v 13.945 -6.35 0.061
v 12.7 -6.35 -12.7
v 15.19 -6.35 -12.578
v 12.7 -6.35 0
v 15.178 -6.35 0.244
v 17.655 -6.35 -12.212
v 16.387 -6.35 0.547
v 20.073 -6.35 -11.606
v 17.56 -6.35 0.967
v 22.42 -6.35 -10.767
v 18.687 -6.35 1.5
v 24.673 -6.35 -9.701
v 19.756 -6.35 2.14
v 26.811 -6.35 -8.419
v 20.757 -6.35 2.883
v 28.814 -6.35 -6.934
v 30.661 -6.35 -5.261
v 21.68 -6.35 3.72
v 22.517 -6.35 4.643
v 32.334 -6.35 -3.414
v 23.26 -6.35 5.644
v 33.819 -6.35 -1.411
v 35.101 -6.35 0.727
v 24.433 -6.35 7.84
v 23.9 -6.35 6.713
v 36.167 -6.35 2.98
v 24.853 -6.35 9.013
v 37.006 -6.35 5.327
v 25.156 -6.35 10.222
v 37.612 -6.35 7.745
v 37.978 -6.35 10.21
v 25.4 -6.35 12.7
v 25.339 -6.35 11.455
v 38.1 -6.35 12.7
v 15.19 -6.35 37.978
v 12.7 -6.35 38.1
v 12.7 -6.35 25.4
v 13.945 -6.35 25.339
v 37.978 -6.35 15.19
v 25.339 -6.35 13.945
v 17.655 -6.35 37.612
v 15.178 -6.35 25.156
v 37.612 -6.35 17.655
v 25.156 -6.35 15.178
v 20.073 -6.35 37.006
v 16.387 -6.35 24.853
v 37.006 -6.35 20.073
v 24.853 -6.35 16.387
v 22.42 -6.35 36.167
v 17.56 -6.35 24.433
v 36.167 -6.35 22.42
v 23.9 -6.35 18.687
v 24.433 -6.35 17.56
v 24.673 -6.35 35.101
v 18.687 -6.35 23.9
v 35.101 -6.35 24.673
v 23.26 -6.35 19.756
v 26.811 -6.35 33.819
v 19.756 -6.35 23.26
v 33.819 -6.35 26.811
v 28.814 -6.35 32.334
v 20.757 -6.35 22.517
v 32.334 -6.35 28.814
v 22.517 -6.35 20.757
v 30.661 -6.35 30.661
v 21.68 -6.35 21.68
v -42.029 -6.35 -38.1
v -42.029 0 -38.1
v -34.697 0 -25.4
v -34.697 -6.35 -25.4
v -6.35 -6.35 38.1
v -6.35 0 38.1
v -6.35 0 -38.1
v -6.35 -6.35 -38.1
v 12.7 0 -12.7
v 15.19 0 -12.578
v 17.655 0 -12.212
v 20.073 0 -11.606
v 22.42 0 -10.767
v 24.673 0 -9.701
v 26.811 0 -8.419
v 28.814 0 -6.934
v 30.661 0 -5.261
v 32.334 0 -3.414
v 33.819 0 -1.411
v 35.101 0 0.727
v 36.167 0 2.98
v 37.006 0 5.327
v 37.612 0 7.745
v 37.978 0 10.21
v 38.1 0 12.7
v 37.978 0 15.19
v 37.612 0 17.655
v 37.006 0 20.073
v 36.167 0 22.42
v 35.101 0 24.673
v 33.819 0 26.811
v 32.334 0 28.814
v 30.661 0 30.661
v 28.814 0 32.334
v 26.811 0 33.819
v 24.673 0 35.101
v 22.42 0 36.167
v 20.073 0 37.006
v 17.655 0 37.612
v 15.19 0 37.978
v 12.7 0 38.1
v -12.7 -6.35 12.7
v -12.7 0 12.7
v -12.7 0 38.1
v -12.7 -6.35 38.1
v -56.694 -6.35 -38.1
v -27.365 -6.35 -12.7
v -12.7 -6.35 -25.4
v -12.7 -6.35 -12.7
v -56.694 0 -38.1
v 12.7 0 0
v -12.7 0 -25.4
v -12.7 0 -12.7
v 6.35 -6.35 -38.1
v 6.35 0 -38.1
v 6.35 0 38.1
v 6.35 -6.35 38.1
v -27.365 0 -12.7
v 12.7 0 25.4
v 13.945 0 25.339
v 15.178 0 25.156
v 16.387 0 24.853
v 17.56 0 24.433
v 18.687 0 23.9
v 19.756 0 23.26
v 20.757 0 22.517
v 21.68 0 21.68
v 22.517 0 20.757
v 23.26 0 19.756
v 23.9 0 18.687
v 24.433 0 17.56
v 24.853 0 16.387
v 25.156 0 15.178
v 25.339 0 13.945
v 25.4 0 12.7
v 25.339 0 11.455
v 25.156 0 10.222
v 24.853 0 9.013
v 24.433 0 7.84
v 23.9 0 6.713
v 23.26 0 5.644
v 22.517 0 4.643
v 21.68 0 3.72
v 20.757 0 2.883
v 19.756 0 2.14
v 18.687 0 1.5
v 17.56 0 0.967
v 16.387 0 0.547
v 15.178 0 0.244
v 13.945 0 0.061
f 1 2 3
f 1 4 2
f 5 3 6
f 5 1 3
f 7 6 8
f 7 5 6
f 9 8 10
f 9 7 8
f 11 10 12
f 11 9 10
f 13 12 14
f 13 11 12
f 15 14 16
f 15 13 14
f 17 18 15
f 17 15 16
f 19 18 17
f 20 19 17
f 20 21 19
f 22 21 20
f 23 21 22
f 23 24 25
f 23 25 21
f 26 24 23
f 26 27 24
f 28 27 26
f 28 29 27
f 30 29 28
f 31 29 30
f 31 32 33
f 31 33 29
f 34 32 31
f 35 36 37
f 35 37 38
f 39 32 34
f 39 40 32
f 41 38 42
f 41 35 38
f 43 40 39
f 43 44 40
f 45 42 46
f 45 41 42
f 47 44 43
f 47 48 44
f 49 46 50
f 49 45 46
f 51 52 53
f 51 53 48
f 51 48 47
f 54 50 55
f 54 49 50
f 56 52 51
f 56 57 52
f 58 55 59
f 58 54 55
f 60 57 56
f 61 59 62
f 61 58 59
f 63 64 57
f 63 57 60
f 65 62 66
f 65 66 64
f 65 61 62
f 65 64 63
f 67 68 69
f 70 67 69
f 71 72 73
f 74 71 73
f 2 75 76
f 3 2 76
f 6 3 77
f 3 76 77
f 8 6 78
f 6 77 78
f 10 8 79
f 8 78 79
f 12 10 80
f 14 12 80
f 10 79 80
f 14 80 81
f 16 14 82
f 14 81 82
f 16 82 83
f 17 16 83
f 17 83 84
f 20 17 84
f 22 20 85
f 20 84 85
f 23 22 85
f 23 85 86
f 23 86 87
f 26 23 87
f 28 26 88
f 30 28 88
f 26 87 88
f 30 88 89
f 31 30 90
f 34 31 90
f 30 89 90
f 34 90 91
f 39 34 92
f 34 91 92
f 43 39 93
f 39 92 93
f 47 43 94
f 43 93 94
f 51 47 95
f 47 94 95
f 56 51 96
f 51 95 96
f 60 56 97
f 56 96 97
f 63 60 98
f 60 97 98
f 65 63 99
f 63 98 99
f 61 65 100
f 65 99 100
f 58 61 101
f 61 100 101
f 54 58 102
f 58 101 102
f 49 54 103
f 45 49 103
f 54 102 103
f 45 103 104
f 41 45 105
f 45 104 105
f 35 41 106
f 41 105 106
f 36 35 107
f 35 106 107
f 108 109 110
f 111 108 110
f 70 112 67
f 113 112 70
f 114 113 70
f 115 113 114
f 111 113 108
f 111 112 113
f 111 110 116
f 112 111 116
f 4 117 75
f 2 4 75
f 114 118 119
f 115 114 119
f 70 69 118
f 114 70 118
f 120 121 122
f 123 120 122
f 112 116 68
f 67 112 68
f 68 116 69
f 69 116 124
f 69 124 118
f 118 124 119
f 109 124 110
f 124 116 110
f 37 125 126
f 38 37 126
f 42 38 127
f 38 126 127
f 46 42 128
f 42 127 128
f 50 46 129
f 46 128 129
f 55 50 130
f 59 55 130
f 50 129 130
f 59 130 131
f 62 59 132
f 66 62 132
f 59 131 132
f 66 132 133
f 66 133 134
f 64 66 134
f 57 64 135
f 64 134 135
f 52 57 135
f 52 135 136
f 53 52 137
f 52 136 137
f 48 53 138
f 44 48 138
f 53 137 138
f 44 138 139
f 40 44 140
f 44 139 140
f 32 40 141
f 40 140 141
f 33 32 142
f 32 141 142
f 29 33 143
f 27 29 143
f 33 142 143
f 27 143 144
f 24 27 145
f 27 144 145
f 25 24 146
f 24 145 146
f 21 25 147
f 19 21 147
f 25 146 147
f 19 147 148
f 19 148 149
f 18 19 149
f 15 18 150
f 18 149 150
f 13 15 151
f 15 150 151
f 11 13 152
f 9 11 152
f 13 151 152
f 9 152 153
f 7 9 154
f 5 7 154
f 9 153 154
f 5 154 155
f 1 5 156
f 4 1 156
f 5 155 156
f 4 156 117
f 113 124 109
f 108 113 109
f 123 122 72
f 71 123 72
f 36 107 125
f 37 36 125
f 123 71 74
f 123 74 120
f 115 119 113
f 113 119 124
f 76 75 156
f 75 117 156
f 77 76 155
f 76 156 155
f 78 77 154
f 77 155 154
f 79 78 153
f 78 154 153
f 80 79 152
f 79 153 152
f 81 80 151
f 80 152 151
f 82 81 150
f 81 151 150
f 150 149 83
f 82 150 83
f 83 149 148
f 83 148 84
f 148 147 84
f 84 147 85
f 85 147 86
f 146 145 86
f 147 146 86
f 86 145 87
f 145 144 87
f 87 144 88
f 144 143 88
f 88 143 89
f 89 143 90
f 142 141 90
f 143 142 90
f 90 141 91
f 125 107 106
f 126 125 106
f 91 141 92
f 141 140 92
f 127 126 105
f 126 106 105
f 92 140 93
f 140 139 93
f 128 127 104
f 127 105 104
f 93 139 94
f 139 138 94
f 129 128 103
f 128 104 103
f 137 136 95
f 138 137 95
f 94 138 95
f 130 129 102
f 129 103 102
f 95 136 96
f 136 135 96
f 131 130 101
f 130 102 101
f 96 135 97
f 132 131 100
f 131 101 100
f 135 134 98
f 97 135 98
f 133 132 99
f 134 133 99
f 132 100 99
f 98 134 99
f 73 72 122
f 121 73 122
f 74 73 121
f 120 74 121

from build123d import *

# Parameters (mm, degrees)
F1_DEPTH = 6.35


with BuildPart() as f1:
    # F0 (on Front) → F1 (new body)
    with BuildSketch(Plane.XZ):
        Polygon((-12.7, 12.7), (-12.7, 38.1), (-56.694091, -38.1), (-42.029394, -38.1), (-34.697045, -25.4), (-27.364697, -12.7), align=None)
        Polygon((6.35, 38.1), (-6.35, 38.1), (-6.35, 12.7), (-6.35, -12.7), (-6.35, -25.4), (-6.35, -38.1), (6.35, -38.1), (6.35, -12.7), (6.35, 0), (6.35, 25.4), align=None)
        with BuildLine():
            ThreePointArc((12.7, -12.7), (38.1, 12.7), (12.7, 38.1))
            Line((12.7, 38.1), (12.7, 25.4))
            ThreePointArc((12.7, 25.4), (25.4, 12.7), (12.7, 0))
            Line((12.7, 0), (12.7, -12.7))
        make_face()
        Polygon((-12.7, -25.4), (-12.7, -12.7), (-27.364697, -12.7), (-34.697045, -25.4), align=None)
    extrude(amount=F1_DEPTH)


solid = f1.part
